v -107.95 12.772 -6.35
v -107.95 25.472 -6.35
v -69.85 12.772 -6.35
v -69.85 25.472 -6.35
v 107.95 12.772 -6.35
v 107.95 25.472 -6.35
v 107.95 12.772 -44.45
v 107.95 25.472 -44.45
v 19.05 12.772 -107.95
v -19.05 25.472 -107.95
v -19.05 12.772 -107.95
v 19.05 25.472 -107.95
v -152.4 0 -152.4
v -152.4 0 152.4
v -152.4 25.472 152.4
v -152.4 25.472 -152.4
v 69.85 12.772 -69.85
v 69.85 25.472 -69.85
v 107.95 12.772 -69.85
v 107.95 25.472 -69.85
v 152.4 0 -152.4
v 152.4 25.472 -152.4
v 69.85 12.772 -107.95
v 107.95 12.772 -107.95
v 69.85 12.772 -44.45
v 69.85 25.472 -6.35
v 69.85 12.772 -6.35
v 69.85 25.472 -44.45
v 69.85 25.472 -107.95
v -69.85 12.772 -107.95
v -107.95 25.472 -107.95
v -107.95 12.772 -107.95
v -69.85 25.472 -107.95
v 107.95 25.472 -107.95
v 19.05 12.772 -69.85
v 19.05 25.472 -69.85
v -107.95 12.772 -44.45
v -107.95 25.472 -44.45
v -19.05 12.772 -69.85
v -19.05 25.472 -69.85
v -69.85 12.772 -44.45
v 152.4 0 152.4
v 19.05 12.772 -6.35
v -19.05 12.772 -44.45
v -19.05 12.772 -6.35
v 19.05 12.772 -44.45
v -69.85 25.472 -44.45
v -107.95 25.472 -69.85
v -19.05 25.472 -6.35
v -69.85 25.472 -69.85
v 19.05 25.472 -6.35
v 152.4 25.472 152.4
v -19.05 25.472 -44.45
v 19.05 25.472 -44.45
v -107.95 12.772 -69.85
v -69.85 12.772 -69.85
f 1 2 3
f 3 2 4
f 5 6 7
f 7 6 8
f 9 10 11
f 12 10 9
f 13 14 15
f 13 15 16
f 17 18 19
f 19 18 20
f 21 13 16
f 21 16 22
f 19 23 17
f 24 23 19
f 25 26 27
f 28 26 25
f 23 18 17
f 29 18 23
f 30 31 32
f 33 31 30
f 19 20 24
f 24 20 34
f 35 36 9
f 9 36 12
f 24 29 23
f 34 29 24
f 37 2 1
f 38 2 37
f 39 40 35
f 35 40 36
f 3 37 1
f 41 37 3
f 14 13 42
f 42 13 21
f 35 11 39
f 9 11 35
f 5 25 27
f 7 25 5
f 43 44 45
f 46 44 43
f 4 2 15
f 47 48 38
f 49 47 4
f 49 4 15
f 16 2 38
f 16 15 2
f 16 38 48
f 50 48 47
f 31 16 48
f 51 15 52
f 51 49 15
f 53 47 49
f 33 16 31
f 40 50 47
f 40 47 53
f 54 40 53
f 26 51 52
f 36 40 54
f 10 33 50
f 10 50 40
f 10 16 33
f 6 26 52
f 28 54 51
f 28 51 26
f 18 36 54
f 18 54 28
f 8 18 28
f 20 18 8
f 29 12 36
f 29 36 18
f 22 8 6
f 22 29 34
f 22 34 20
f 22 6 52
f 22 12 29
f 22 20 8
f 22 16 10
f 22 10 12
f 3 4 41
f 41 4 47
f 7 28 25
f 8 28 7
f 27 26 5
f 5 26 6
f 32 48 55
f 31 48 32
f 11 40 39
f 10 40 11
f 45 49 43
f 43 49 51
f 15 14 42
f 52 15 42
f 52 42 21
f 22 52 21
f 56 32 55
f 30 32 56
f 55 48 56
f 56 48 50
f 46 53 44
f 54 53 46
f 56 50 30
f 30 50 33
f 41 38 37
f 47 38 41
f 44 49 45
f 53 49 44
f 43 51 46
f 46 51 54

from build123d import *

# Parameters (mm, degrees)
SKETCH1_W            = 304.8
SKETCH1_H            = 304.8
BOSS_EXTRUDE1_DEPTH  = 25.471786057
SKETCH2_W            = 38.1
SKETCH2_H            = 38.1
CUT_EXTRUDE1_DEPTH   = 12.7
LPATTERN1_COUNT      = 2
LPATTERN1_PITCH      = 63.5
LPATTERN1_COUNT_DIR2 = 3
LPATTERN1_PITCH_DIR2 = 88.9


with BuildPart() as part:
    # Sketch1 → Boss-Extrude1 (new body)
    with BuildSketch(Plane(origin=(0, 0, 0), x_dir=(1, 0, 0), z_dir=(0, 1, 0))):
        Rectangle(SKETCH1_W, SKETCH1_H)
    extrude(amount=BOSS_EXTRUDE1_DEPTH)

    # Sketch2 → Cut-Extrude1 (cut)
    with BuildSketch(Plane(origin=(0, 25.471786057, 0), x_dir=(1, 0, 0), z_dir=(0, 1, 0))):
        with Locations((-88.9, 88.9)):
            Rectangle(SKETCH2_W, SKETCH2_H)
    cut_extrude1 = extrude(amount=-CUT_EXTRUDE1_DEPTH, mode=Mode.SUBTRACT)

    # LPattern1: Cut-Extrude1 2 × 3
    with Locations(*[(j * LPATTERN1_PITCH_DIR2, 0, i * LPATTERN1_PITCH) for i in range(LPATTERN1_COUNT) for j in range(LPATTERN1_COUNT_DIR2) if (i, j) != (0, 0)]):
        add(cut_extrude1, mode=Mode.SUBTRACT)


solid = part.part
